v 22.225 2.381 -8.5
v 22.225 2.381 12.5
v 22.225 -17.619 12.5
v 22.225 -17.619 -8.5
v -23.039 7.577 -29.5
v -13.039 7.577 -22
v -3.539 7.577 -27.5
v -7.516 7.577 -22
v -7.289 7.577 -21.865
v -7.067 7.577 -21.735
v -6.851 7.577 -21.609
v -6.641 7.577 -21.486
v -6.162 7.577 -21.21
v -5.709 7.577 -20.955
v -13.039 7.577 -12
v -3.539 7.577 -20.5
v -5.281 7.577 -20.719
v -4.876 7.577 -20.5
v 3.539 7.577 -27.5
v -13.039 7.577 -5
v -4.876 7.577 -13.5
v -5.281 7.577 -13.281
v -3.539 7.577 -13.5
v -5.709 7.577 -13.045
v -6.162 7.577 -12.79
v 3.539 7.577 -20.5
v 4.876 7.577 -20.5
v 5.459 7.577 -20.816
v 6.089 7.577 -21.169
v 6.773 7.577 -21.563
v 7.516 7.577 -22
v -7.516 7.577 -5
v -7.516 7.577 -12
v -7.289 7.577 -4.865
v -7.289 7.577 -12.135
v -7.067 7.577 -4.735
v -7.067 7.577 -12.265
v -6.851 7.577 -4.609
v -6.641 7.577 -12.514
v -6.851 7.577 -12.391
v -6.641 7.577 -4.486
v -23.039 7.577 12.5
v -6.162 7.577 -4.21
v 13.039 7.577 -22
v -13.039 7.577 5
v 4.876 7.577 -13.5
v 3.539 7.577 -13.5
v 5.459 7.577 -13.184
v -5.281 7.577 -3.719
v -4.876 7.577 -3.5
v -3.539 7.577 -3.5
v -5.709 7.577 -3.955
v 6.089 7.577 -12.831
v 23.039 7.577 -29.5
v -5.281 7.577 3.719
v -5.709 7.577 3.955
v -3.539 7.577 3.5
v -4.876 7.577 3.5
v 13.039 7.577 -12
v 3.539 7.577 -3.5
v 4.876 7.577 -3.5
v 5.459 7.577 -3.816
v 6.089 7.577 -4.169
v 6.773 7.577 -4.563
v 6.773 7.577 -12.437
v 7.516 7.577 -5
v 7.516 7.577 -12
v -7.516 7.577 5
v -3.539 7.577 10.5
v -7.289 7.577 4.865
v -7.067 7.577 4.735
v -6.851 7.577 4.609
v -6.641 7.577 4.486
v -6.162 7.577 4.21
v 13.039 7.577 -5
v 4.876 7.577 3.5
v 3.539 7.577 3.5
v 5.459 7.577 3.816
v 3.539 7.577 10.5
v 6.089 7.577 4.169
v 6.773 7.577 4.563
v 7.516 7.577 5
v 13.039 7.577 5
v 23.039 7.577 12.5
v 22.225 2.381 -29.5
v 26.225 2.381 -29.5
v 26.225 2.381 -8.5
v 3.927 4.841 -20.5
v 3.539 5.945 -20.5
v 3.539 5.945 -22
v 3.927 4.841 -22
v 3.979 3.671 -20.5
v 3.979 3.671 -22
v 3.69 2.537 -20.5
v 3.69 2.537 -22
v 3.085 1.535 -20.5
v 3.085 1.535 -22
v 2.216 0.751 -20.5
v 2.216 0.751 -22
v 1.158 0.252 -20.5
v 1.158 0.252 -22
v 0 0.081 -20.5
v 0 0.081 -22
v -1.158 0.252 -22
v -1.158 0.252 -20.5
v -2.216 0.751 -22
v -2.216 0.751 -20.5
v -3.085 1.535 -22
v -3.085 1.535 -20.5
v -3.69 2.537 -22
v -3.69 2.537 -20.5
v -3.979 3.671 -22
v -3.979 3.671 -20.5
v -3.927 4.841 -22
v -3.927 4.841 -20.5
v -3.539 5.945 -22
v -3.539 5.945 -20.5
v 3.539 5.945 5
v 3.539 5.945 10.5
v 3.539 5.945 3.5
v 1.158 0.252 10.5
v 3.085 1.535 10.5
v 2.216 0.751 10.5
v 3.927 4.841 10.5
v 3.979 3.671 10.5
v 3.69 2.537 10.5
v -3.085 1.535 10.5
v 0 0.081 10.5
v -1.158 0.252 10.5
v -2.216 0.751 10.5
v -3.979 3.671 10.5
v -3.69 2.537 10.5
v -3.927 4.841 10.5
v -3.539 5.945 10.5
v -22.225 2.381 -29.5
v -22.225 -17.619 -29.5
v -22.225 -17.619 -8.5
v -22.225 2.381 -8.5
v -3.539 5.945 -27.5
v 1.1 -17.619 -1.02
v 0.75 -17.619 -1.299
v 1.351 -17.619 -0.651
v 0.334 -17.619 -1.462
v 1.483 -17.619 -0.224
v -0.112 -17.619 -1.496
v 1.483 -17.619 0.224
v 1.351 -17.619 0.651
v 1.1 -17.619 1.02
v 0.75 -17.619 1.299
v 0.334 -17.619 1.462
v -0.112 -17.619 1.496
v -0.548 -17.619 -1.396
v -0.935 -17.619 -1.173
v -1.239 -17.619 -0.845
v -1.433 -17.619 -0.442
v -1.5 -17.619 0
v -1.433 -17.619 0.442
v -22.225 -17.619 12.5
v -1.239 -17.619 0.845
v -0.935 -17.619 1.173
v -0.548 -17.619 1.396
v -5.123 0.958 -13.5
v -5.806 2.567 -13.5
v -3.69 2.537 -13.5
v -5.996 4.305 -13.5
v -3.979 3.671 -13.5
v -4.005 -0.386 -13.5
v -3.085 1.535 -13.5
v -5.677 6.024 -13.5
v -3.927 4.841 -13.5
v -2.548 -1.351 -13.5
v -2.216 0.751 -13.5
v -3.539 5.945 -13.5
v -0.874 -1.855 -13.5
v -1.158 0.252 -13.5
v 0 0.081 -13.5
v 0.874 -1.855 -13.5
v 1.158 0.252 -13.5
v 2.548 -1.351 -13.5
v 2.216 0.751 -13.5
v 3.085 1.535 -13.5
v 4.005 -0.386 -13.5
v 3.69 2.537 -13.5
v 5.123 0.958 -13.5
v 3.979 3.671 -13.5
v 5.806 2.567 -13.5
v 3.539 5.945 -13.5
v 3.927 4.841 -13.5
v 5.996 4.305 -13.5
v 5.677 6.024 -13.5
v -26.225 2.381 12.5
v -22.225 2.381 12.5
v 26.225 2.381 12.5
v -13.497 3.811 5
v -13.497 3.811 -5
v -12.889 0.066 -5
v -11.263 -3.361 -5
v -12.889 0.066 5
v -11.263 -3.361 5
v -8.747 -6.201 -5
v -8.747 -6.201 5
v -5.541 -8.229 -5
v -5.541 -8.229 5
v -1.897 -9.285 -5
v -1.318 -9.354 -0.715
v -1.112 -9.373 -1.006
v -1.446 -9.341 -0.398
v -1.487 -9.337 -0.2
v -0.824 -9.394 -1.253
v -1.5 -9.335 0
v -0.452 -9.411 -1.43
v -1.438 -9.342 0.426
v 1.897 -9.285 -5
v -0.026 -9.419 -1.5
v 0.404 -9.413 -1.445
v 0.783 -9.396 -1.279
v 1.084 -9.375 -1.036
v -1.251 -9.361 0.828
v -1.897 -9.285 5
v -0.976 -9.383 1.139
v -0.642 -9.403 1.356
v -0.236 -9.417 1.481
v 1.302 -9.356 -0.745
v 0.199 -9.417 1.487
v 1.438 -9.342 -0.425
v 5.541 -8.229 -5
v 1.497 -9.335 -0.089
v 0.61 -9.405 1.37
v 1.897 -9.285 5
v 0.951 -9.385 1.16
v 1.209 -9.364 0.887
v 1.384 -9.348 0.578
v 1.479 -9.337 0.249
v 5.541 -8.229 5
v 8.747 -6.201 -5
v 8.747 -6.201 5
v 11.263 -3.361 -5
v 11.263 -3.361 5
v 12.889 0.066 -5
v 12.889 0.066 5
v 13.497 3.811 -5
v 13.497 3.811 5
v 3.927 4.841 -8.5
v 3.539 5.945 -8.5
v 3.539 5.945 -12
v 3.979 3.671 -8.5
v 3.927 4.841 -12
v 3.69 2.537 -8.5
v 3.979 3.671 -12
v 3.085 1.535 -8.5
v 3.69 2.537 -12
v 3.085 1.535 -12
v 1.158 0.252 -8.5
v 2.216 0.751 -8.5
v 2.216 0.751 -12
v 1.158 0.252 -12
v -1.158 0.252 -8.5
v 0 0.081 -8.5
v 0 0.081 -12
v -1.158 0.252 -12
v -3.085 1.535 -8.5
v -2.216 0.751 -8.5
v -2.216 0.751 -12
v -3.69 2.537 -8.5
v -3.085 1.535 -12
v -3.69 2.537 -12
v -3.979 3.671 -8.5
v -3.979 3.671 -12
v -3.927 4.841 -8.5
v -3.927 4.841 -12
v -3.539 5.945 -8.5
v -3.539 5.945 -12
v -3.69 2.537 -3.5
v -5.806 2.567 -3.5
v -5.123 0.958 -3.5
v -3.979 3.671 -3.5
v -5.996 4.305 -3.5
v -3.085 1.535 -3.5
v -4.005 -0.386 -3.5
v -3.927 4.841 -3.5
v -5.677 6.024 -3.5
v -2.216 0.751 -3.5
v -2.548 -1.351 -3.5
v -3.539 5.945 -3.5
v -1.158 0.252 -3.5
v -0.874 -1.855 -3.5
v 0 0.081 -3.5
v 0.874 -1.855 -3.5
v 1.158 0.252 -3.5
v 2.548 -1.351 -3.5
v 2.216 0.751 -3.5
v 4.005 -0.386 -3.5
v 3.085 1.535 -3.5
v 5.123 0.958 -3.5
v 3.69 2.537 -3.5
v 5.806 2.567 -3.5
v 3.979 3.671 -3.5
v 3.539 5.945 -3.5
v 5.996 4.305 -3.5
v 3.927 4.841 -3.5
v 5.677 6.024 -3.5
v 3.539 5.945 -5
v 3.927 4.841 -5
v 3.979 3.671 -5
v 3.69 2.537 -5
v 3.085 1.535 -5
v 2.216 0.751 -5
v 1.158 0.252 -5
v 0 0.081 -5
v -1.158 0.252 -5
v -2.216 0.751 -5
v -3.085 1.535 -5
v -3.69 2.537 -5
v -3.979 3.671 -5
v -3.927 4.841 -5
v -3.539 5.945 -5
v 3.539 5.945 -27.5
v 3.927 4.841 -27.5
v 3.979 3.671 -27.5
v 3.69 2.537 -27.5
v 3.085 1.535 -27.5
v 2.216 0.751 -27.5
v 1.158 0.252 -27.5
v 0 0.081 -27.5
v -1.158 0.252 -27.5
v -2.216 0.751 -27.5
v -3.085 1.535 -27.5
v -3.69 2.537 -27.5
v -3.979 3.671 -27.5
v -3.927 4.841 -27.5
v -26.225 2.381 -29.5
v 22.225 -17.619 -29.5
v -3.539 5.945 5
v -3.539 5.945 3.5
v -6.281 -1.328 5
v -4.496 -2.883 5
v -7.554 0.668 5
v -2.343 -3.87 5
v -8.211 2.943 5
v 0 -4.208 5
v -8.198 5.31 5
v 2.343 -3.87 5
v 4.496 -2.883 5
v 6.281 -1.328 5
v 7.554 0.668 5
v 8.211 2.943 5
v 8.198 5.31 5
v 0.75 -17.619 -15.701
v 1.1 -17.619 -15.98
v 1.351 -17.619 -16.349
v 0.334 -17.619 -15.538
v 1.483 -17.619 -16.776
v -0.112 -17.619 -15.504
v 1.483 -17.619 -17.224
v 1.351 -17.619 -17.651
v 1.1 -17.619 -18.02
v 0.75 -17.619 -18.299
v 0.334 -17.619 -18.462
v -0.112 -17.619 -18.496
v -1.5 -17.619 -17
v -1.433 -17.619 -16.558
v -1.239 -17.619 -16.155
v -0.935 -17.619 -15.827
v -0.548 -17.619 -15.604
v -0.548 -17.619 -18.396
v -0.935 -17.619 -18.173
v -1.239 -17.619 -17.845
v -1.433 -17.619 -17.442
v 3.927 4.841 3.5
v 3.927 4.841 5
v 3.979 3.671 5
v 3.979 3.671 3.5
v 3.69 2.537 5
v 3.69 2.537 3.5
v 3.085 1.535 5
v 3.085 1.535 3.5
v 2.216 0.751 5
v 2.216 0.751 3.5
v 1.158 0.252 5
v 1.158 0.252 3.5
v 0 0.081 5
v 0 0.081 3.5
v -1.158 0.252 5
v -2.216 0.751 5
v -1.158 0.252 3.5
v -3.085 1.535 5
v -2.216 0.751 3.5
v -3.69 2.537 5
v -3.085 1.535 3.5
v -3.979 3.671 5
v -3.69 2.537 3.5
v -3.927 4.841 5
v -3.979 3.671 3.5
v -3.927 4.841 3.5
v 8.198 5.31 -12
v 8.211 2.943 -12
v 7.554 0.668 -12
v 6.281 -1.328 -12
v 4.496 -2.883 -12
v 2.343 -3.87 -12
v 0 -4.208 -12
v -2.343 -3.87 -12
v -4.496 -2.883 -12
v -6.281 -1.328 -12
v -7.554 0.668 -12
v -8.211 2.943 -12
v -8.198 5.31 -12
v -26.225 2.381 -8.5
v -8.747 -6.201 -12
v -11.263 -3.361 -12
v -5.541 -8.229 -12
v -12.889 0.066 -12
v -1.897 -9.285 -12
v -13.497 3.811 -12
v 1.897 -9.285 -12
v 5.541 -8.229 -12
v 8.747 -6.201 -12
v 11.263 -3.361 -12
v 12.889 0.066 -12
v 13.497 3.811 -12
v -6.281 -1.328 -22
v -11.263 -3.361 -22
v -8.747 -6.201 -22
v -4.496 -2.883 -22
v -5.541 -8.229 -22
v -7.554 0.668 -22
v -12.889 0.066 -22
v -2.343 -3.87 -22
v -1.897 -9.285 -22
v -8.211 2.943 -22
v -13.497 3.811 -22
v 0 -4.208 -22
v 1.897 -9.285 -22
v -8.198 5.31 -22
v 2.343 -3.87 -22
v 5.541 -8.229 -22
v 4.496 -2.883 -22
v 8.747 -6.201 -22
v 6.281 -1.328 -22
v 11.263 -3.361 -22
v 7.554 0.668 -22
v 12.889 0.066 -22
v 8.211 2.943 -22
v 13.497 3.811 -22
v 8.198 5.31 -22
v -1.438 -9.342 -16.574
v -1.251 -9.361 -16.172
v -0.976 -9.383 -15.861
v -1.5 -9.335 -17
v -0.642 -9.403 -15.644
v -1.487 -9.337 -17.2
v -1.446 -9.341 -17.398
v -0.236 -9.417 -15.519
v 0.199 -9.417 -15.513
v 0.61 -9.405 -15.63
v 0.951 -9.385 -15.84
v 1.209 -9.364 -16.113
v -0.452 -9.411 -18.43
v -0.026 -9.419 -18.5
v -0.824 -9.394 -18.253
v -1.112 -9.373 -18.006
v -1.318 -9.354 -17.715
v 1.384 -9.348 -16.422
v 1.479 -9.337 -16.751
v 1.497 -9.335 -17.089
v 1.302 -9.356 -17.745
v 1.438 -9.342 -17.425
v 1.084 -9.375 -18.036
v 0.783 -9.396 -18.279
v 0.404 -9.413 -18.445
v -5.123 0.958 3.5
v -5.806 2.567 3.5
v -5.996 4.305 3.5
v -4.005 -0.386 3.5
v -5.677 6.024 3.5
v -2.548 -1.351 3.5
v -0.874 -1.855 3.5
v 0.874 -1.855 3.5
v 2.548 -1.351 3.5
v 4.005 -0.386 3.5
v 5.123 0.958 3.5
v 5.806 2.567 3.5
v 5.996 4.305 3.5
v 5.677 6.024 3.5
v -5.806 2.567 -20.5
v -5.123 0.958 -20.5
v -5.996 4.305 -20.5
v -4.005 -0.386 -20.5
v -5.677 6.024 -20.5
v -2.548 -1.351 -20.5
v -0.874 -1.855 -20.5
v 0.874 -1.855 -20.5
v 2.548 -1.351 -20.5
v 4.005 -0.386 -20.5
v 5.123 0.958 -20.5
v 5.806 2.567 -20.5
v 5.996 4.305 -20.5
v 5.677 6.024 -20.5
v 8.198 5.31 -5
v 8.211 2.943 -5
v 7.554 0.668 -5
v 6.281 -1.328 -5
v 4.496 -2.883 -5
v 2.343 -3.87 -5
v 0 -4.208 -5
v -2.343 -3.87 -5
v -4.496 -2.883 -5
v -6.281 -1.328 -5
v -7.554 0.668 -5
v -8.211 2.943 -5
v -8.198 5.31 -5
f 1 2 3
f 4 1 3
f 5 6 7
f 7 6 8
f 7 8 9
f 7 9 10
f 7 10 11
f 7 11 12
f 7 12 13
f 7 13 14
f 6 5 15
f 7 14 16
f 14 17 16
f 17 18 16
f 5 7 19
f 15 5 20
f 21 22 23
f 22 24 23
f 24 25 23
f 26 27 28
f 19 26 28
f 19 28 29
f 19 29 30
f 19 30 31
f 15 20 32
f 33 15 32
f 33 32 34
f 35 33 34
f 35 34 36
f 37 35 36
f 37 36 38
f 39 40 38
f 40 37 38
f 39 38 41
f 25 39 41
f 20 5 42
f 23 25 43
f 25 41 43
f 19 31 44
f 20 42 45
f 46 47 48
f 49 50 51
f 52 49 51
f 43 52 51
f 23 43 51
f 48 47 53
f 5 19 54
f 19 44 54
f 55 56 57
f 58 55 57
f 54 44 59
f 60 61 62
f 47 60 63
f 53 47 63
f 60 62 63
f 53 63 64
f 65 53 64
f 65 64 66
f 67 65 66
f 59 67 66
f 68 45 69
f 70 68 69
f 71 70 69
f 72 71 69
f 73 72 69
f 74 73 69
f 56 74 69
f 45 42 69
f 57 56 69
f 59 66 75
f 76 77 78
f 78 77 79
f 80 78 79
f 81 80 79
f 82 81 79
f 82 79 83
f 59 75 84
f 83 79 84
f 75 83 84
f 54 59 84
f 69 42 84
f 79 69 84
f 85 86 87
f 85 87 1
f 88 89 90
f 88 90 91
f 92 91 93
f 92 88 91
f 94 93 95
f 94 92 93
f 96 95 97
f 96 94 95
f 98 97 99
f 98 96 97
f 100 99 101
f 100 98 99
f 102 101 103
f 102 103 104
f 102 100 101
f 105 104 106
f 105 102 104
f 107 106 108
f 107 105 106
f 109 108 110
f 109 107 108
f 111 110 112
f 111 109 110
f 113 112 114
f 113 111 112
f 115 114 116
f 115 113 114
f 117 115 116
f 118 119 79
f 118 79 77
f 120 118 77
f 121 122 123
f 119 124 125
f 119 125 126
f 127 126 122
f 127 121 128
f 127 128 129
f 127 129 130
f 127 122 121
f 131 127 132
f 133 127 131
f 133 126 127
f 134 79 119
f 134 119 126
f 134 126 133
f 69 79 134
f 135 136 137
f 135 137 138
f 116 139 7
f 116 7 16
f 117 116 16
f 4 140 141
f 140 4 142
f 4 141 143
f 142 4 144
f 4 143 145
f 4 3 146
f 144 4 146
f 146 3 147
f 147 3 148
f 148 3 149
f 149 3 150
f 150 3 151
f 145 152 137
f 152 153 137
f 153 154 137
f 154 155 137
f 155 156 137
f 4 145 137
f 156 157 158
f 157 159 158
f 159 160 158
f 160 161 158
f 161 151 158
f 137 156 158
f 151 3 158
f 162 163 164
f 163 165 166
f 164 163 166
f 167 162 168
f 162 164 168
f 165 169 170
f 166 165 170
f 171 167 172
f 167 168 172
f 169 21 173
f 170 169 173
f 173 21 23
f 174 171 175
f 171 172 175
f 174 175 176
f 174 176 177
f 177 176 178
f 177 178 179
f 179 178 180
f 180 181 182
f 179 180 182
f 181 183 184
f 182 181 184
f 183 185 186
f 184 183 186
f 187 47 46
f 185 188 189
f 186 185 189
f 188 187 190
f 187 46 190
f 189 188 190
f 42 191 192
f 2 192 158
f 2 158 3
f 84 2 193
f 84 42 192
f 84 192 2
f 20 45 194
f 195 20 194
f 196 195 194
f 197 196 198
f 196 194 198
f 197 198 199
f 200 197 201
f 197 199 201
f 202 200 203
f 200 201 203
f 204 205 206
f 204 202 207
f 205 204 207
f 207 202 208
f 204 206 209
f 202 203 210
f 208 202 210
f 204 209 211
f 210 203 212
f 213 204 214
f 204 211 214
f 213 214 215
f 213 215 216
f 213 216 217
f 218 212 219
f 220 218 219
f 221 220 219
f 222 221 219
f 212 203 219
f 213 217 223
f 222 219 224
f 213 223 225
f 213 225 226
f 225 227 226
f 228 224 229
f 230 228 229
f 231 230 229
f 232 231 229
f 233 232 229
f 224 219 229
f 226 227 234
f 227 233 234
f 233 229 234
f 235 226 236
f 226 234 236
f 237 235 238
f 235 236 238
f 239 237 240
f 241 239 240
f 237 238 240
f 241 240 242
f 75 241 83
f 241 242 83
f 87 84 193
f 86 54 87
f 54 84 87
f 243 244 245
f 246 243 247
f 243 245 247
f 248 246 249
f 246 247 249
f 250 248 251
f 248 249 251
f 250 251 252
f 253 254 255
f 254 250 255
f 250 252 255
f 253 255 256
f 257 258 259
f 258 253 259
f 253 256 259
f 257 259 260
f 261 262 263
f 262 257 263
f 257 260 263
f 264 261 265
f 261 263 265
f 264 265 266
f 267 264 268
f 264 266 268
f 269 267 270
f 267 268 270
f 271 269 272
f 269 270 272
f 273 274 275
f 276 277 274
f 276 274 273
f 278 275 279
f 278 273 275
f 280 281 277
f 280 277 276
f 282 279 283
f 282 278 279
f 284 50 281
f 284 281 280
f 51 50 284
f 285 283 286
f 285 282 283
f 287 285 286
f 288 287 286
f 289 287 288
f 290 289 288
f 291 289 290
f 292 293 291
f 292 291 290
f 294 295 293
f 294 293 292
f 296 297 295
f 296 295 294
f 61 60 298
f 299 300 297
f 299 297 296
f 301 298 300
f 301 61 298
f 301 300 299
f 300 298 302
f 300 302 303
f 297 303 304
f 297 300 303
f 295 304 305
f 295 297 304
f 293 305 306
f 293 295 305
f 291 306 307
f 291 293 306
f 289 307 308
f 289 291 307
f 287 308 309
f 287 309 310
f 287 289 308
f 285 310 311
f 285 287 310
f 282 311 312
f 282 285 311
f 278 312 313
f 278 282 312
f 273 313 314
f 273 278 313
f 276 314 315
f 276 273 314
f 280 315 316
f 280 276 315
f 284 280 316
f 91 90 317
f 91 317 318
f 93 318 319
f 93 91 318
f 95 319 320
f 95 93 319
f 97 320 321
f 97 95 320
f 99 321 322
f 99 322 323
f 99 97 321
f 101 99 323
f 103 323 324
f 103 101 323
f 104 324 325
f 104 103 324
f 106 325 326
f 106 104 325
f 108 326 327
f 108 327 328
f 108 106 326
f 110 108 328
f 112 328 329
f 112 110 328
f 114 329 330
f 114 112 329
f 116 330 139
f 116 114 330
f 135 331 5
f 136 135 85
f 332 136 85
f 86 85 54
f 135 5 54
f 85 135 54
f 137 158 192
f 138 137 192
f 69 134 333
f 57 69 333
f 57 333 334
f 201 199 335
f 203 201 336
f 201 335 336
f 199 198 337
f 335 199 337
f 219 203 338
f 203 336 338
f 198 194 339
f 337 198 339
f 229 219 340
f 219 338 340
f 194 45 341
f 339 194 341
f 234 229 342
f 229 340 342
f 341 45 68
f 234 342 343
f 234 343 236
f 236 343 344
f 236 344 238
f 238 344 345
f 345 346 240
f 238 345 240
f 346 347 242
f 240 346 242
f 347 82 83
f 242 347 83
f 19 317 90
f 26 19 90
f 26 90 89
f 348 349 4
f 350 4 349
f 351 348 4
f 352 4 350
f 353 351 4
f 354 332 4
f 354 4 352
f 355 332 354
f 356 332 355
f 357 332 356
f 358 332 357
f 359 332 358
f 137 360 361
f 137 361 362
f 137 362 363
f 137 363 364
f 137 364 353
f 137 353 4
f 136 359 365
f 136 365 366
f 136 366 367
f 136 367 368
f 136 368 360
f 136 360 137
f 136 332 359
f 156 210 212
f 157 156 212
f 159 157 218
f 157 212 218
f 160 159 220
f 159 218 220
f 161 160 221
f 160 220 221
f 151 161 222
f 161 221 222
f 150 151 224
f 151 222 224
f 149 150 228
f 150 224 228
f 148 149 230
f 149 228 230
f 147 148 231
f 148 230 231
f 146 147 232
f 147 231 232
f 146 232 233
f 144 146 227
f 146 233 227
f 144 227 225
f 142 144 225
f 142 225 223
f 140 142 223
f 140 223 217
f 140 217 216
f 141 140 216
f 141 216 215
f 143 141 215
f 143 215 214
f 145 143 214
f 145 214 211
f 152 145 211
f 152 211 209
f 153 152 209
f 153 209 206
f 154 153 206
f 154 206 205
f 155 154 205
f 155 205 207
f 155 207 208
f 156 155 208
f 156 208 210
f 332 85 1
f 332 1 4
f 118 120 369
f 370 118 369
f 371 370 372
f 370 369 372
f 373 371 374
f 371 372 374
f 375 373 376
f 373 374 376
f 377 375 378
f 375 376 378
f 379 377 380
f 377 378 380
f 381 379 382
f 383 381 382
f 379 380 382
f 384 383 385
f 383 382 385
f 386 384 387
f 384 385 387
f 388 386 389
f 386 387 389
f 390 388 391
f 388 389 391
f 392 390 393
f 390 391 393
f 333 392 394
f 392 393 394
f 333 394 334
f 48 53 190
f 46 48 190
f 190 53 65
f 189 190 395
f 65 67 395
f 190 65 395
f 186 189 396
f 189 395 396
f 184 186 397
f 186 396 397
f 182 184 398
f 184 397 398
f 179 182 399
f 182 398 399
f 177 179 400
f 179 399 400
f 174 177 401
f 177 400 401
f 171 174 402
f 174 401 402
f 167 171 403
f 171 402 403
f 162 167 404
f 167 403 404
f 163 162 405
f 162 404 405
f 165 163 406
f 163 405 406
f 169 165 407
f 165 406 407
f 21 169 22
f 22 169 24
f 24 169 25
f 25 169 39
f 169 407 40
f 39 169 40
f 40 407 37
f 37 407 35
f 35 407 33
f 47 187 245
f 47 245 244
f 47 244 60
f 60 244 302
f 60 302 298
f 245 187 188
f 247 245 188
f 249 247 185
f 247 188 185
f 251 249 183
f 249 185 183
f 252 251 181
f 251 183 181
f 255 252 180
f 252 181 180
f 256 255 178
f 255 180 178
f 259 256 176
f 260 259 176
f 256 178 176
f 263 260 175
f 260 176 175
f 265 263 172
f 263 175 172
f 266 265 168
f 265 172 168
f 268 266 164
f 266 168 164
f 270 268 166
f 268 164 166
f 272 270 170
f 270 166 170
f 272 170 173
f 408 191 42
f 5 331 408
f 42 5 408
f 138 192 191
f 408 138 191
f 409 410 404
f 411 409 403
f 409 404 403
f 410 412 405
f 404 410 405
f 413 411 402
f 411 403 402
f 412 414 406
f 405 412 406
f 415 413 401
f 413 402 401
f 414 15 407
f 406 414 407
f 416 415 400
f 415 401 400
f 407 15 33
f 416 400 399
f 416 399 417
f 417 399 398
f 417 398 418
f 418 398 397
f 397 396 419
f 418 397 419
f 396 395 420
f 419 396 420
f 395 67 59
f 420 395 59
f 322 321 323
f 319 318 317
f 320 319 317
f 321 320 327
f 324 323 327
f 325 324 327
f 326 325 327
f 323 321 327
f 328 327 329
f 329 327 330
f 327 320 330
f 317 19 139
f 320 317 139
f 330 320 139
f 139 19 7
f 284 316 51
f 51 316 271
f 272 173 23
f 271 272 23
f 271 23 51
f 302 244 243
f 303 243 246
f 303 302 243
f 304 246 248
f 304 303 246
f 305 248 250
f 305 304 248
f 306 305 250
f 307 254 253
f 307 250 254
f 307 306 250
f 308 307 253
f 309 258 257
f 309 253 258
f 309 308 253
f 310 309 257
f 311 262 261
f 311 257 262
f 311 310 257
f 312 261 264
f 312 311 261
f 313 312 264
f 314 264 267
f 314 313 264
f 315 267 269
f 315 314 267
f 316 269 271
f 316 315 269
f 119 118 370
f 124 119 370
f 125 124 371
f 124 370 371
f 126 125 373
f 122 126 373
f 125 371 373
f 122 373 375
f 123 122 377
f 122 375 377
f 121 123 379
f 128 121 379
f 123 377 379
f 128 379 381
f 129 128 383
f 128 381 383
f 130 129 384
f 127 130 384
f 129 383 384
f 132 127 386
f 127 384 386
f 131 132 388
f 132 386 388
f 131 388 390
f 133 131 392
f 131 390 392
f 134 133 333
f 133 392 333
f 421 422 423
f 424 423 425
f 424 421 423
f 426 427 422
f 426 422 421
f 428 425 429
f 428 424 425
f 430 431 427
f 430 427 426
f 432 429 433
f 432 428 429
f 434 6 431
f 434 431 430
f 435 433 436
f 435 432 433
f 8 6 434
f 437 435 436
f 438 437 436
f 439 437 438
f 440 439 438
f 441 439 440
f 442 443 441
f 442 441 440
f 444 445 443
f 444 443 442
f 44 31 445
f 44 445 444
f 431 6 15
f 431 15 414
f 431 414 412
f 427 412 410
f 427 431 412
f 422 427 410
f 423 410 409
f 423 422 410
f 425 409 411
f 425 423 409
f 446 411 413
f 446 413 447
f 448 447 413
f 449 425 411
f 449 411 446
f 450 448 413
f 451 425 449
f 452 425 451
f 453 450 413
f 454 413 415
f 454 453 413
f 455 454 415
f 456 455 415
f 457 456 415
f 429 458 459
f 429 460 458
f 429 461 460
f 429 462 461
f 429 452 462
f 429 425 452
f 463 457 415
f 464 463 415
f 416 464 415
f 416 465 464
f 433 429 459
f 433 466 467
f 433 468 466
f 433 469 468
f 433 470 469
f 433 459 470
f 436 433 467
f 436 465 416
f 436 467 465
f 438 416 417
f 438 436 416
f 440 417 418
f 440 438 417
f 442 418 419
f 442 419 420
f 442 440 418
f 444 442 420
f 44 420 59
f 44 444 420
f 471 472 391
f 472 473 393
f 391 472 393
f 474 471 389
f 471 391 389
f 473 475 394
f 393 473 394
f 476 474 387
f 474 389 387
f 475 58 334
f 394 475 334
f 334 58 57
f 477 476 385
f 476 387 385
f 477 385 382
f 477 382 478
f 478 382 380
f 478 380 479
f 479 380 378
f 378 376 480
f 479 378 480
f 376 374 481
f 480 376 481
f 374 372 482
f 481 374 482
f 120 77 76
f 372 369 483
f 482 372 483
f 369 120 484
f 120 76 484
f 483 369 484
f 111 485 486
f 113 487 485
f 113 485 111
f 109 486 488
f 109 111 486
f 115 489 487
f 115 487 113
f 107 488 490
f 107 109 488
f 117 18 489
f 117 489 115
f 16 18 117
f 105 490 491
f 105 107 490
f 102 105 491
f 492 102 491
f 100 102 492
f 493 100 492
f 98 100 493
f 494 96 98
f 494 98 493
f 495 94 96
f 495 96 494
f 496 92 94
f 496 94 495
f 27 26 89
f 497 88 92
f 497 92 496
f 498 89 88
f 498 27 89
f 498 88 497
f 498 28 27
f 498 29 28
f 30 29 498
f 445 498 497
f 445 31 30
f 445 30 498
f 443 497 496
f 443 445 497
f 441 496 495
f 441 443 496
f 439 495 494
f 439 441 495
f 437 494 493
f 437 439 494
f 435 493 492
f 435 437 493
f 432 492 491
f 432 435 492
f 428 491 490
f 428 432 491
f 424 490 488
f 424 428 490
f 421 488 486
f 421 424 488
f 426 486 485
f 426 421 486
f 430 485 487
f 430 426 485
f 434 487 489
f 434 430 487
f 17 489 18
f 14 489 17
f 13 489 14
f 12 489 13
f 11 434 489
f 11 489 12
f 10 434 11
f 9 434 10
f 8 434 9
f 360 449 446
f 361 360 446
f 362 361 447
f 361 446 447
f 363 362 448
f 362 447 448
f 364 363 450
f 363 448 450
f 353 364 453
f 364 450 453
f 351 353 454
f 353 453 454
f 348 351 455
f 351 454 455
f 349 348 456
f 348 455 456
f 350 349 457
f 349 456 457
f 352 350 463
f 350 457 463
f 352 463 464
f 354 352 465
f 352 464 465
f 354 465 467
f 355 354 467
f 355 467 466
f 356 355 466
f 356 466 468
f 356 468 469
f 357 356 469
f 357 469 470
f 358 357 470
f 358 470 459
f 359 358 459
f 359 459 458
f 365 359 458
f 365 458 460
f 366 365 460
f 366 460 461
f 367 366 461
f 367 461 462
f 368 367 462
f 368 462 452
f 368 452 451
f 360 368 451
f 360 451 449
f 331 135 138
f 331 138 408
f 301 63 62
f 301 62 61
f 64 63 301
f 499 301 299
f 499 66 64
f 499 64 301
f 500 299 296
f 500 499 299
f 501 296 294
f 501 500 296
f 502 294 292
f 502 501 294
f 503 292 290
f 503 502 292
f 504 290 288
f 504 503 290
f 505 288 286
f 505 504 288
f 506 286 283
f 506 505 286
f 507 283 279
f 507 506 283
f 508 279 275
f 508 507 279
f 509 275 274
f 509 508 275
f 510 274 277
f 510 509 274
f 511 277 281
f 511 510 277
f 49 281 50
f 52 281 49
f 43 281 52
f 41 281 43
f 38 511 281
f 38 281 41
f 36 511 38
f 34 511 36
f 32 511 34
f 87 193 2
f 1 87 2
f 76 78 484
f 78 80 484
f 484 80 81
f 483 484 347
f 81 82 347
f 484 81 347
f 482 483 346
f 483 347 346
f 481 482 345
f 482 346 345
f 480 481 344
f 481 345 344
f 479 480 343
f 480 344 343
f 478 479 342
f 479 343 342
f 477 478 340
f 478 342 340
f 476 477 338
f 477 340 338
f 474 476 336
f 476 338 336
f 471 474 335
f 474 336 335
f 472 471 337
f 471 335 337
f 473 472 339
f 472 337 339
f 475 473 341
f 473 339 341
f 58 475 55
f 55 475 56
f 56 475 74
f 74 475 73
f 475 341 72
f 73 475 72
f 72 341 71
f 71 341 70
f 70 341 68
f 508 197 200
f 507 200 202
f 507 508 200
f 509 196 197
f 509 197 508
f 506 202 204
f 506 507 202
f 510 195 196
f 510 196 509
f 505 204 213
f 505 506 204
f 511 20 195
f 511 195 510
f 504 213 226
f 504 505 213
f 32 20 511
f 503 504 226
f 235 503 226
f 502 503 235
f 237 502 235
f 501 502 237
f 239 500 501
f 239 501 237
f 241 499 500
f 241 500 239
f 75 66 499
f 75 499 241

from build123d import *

# Parameters (mm, degrees)
BOSS_EXTRUDE1_DEPTH = 12.5
BOSS_EXTRUDE2_DEPTH = 7.5
BOSS_EXTRUDE3_DEPTH = 7.5
SKETCH5_W           = 44.45
SKETCH5_H           = 25
CUT_EXTRUDE1_DEPTH  = 10
CUT_EXTRUDE2_START  = -1.632728
SKETCH6_W           = 7.078863834
SKETCH6_H           = 10
CUT_EXTRUDE2_DEPTH  = 1.632728
BOSS_EXTRUDE4_DEPTH = 2
SKETCH8_R           = 1.5
CUT_EXTRUDE3_DEPTH  = 40


with BuildPart() as part:
    # Sketch1 → Boss-Extrude1 (new, symmetric)
    with BuildSketch(Plane.XY):
        with BuildLine():
            Line((-23.039431917, 7.577421516), (-13.039431917, 7.577421516))
            ThreePointArc((-13.039431917, 7.577421516), (0, -9.41875), (13.039431917, 7.577421516))
            Line((13.039431917, 7.577421516), (23.039431917, 7.577421516))
            Line((23.039431917, 7.577421516), (26.225, 2.38125))
            Line((26.225, 2.38125), (22.225, 2.38125))
            Line((22.225, 2.38125), (22.225, -17.61875))
            Line((22.225, -17.61875), (-22.225, -17.61875))
            Line((-22.225, -17.61875), (-22.225, 2.38125))
            Line((-22.225, 2.38125), (-26.225, 2.38125))
            Line((-26.225, 2.38125), (-23.039431917, 7.577421516))
        make_face()
    extrude(amount=BOSS_EXTRUDE1_DEPTH, both=True)

    # Sketch2 → Boss-Extrude2 (add)
    with BuildSketch(Plane.XY.offset(5)):
        with BuildLine():
            Line((-3.539431917, 5.944693506), (-3.539431917, 7.577421516))
            Line((-3.539431917, 7.577421516), (-13.039431917, 7.577421516))
            ThreePointArc((-13.039431917, 7.577421516), (0, -9.41875), (13.039431917, 7.577421516))
            Line((13.039431917, 7.577421516), (3.539431917, 7.577421516))
            Line((3.539431917, 7.577421516), (3.539431917, 5.944693506))
            ThreePointArc((3.539431917, 5.944693506), (0, 0.08125), (-3.539431917, 5.944693506))
        make_face()
    extrude(amount=BOSS_EXTRUDE2_DEPTH)

    # Sketch3 → Boss-Extrude3 (add)
    with BuildSketch(Plane.XY.offset(-5)):
        with BuildLine():
            Line((3.539431917, 7.577421516), (3.539431917, 5.944693506))
            ThreePointArc((3.539431917, 5.944693506), (0, 0.08125), (-3.539431917, 5.944693506))
            Line((-3.539431917, 5.944693506), (-3.539431917, 7.577421516))
            Line((-3.539431917, 7.577421516), (-13.039431917, 7.577421516))
            ThreePointArc((-13.039431917, 7.577421516), (0, -9.41875), (13.039431917, 7.577421516))
            Line((13.039431917, 7.577421516), (3.539431917, 7.577421516))
        make_face()
    extrude(amount=-BOSS_EXTRUDE3_DEPTH)

    # Sketch4 → Revolve1 (revolve)
    with BuildSketch(Plane(origin=(0, 4.08125, 0), x_dir=(1, 0, 0), z_dir=(0, 1, 0)), mode=Mode.PRIVATE) as revolve1_sk:
        Polygon((-4, -5), (-4, -3.5), (-6, -3.5), (-8.289431917, -5), align=None)
        Polygon((-4, 5), (-4, 3.5), (-6, 3.5), (-8.289431917, 5), align=None)
    revolve(revolve1_sk.sketch.rotate(Axis((0, 4.08125, 0), (0, 0, -1)), 27.765950742), axis=Axis((0, 4.08125, 0), (0, 0, -1)))

    # Sketch5 → Cut-Extrude1 (cut)
    with BuildSketch(Plane(origin=(0, 7.577421516, 0), x_dir=(1, 0, 0), z_dir=(0, 1, 0))):
        Rectangle(SKETCH5_W, SKETCH5_H)
    extrude(amount=CUT_EXTRUDE1_DEPTH, mode=Mode.SUBTRACT)

    # Sketch6 → Cut-Extrude2 (cut)
    with BuildSketch(Plane(origin=(0, 7.577421516, 0), x_dir=(1, 0, 0), z_dir=(0, 1, 0)).offset(CUT_EXTRUDE2_START)):
        Rectangle(SKETCH6_W, SKETCH6_H)
    extrude(amount=CUT_EXTRUDE2_DEPTH, mode=Mode.SUBTRACT)

    # Sketch7 → Boss-Extrude4 (add)
    with BuildSketch(Plane.XY.offset(12.5)):
        Polygon((-22.225, 2.38125), (-22.225, 7.577421516), (22.225, 7.577421516), (22.225, 2.38125), (22.225, -12.422578484), (-22.225, -12.422578484), align=None)
    boss_extrude4 = extrude(amount=-BOSS_EXTRUDE4_DEPTH)

    # Mirror1: Boss-Extrude4 across plane
    add(boss_extrude4.mirror(Plane.XY))

    # SurfaceCut1
    split(bisect_by=Plane(origin=(0, 0, -8.5), x_dir=(-1, 0, 0), z_dir=(0, 0, -1)), keep=Keep.BOTTOM)

    # Mirror2: part across plane


with BuildPart() as part_1:
    add(part.part)
    add(part.part.mirror(Plane(origin=(0, 0, -8.5), x_dir=(1, 0, 0), z_dir=(0, 0, -1))))

    # Sketch8 → Cut-Extrude3 (cut)
    with BuildSketch(Plane(origin=(0, 7.577421516, 0), x_dir=(1, 0, 0), z_dir=(0, 1, 0))):
        with Locations(Location((0, 0, 0), (0, 0, 180))):
            Circle(SKETCH8_R)
        with Locations(Location((0, 17, 0), (0, 0, 180))):
            Circle(SKETCH8_R)
    extrude(amount=-CUT_EXTRUDE3_DEPTH, mode=Mode.SUBTRACT)


solid = part_1.part
